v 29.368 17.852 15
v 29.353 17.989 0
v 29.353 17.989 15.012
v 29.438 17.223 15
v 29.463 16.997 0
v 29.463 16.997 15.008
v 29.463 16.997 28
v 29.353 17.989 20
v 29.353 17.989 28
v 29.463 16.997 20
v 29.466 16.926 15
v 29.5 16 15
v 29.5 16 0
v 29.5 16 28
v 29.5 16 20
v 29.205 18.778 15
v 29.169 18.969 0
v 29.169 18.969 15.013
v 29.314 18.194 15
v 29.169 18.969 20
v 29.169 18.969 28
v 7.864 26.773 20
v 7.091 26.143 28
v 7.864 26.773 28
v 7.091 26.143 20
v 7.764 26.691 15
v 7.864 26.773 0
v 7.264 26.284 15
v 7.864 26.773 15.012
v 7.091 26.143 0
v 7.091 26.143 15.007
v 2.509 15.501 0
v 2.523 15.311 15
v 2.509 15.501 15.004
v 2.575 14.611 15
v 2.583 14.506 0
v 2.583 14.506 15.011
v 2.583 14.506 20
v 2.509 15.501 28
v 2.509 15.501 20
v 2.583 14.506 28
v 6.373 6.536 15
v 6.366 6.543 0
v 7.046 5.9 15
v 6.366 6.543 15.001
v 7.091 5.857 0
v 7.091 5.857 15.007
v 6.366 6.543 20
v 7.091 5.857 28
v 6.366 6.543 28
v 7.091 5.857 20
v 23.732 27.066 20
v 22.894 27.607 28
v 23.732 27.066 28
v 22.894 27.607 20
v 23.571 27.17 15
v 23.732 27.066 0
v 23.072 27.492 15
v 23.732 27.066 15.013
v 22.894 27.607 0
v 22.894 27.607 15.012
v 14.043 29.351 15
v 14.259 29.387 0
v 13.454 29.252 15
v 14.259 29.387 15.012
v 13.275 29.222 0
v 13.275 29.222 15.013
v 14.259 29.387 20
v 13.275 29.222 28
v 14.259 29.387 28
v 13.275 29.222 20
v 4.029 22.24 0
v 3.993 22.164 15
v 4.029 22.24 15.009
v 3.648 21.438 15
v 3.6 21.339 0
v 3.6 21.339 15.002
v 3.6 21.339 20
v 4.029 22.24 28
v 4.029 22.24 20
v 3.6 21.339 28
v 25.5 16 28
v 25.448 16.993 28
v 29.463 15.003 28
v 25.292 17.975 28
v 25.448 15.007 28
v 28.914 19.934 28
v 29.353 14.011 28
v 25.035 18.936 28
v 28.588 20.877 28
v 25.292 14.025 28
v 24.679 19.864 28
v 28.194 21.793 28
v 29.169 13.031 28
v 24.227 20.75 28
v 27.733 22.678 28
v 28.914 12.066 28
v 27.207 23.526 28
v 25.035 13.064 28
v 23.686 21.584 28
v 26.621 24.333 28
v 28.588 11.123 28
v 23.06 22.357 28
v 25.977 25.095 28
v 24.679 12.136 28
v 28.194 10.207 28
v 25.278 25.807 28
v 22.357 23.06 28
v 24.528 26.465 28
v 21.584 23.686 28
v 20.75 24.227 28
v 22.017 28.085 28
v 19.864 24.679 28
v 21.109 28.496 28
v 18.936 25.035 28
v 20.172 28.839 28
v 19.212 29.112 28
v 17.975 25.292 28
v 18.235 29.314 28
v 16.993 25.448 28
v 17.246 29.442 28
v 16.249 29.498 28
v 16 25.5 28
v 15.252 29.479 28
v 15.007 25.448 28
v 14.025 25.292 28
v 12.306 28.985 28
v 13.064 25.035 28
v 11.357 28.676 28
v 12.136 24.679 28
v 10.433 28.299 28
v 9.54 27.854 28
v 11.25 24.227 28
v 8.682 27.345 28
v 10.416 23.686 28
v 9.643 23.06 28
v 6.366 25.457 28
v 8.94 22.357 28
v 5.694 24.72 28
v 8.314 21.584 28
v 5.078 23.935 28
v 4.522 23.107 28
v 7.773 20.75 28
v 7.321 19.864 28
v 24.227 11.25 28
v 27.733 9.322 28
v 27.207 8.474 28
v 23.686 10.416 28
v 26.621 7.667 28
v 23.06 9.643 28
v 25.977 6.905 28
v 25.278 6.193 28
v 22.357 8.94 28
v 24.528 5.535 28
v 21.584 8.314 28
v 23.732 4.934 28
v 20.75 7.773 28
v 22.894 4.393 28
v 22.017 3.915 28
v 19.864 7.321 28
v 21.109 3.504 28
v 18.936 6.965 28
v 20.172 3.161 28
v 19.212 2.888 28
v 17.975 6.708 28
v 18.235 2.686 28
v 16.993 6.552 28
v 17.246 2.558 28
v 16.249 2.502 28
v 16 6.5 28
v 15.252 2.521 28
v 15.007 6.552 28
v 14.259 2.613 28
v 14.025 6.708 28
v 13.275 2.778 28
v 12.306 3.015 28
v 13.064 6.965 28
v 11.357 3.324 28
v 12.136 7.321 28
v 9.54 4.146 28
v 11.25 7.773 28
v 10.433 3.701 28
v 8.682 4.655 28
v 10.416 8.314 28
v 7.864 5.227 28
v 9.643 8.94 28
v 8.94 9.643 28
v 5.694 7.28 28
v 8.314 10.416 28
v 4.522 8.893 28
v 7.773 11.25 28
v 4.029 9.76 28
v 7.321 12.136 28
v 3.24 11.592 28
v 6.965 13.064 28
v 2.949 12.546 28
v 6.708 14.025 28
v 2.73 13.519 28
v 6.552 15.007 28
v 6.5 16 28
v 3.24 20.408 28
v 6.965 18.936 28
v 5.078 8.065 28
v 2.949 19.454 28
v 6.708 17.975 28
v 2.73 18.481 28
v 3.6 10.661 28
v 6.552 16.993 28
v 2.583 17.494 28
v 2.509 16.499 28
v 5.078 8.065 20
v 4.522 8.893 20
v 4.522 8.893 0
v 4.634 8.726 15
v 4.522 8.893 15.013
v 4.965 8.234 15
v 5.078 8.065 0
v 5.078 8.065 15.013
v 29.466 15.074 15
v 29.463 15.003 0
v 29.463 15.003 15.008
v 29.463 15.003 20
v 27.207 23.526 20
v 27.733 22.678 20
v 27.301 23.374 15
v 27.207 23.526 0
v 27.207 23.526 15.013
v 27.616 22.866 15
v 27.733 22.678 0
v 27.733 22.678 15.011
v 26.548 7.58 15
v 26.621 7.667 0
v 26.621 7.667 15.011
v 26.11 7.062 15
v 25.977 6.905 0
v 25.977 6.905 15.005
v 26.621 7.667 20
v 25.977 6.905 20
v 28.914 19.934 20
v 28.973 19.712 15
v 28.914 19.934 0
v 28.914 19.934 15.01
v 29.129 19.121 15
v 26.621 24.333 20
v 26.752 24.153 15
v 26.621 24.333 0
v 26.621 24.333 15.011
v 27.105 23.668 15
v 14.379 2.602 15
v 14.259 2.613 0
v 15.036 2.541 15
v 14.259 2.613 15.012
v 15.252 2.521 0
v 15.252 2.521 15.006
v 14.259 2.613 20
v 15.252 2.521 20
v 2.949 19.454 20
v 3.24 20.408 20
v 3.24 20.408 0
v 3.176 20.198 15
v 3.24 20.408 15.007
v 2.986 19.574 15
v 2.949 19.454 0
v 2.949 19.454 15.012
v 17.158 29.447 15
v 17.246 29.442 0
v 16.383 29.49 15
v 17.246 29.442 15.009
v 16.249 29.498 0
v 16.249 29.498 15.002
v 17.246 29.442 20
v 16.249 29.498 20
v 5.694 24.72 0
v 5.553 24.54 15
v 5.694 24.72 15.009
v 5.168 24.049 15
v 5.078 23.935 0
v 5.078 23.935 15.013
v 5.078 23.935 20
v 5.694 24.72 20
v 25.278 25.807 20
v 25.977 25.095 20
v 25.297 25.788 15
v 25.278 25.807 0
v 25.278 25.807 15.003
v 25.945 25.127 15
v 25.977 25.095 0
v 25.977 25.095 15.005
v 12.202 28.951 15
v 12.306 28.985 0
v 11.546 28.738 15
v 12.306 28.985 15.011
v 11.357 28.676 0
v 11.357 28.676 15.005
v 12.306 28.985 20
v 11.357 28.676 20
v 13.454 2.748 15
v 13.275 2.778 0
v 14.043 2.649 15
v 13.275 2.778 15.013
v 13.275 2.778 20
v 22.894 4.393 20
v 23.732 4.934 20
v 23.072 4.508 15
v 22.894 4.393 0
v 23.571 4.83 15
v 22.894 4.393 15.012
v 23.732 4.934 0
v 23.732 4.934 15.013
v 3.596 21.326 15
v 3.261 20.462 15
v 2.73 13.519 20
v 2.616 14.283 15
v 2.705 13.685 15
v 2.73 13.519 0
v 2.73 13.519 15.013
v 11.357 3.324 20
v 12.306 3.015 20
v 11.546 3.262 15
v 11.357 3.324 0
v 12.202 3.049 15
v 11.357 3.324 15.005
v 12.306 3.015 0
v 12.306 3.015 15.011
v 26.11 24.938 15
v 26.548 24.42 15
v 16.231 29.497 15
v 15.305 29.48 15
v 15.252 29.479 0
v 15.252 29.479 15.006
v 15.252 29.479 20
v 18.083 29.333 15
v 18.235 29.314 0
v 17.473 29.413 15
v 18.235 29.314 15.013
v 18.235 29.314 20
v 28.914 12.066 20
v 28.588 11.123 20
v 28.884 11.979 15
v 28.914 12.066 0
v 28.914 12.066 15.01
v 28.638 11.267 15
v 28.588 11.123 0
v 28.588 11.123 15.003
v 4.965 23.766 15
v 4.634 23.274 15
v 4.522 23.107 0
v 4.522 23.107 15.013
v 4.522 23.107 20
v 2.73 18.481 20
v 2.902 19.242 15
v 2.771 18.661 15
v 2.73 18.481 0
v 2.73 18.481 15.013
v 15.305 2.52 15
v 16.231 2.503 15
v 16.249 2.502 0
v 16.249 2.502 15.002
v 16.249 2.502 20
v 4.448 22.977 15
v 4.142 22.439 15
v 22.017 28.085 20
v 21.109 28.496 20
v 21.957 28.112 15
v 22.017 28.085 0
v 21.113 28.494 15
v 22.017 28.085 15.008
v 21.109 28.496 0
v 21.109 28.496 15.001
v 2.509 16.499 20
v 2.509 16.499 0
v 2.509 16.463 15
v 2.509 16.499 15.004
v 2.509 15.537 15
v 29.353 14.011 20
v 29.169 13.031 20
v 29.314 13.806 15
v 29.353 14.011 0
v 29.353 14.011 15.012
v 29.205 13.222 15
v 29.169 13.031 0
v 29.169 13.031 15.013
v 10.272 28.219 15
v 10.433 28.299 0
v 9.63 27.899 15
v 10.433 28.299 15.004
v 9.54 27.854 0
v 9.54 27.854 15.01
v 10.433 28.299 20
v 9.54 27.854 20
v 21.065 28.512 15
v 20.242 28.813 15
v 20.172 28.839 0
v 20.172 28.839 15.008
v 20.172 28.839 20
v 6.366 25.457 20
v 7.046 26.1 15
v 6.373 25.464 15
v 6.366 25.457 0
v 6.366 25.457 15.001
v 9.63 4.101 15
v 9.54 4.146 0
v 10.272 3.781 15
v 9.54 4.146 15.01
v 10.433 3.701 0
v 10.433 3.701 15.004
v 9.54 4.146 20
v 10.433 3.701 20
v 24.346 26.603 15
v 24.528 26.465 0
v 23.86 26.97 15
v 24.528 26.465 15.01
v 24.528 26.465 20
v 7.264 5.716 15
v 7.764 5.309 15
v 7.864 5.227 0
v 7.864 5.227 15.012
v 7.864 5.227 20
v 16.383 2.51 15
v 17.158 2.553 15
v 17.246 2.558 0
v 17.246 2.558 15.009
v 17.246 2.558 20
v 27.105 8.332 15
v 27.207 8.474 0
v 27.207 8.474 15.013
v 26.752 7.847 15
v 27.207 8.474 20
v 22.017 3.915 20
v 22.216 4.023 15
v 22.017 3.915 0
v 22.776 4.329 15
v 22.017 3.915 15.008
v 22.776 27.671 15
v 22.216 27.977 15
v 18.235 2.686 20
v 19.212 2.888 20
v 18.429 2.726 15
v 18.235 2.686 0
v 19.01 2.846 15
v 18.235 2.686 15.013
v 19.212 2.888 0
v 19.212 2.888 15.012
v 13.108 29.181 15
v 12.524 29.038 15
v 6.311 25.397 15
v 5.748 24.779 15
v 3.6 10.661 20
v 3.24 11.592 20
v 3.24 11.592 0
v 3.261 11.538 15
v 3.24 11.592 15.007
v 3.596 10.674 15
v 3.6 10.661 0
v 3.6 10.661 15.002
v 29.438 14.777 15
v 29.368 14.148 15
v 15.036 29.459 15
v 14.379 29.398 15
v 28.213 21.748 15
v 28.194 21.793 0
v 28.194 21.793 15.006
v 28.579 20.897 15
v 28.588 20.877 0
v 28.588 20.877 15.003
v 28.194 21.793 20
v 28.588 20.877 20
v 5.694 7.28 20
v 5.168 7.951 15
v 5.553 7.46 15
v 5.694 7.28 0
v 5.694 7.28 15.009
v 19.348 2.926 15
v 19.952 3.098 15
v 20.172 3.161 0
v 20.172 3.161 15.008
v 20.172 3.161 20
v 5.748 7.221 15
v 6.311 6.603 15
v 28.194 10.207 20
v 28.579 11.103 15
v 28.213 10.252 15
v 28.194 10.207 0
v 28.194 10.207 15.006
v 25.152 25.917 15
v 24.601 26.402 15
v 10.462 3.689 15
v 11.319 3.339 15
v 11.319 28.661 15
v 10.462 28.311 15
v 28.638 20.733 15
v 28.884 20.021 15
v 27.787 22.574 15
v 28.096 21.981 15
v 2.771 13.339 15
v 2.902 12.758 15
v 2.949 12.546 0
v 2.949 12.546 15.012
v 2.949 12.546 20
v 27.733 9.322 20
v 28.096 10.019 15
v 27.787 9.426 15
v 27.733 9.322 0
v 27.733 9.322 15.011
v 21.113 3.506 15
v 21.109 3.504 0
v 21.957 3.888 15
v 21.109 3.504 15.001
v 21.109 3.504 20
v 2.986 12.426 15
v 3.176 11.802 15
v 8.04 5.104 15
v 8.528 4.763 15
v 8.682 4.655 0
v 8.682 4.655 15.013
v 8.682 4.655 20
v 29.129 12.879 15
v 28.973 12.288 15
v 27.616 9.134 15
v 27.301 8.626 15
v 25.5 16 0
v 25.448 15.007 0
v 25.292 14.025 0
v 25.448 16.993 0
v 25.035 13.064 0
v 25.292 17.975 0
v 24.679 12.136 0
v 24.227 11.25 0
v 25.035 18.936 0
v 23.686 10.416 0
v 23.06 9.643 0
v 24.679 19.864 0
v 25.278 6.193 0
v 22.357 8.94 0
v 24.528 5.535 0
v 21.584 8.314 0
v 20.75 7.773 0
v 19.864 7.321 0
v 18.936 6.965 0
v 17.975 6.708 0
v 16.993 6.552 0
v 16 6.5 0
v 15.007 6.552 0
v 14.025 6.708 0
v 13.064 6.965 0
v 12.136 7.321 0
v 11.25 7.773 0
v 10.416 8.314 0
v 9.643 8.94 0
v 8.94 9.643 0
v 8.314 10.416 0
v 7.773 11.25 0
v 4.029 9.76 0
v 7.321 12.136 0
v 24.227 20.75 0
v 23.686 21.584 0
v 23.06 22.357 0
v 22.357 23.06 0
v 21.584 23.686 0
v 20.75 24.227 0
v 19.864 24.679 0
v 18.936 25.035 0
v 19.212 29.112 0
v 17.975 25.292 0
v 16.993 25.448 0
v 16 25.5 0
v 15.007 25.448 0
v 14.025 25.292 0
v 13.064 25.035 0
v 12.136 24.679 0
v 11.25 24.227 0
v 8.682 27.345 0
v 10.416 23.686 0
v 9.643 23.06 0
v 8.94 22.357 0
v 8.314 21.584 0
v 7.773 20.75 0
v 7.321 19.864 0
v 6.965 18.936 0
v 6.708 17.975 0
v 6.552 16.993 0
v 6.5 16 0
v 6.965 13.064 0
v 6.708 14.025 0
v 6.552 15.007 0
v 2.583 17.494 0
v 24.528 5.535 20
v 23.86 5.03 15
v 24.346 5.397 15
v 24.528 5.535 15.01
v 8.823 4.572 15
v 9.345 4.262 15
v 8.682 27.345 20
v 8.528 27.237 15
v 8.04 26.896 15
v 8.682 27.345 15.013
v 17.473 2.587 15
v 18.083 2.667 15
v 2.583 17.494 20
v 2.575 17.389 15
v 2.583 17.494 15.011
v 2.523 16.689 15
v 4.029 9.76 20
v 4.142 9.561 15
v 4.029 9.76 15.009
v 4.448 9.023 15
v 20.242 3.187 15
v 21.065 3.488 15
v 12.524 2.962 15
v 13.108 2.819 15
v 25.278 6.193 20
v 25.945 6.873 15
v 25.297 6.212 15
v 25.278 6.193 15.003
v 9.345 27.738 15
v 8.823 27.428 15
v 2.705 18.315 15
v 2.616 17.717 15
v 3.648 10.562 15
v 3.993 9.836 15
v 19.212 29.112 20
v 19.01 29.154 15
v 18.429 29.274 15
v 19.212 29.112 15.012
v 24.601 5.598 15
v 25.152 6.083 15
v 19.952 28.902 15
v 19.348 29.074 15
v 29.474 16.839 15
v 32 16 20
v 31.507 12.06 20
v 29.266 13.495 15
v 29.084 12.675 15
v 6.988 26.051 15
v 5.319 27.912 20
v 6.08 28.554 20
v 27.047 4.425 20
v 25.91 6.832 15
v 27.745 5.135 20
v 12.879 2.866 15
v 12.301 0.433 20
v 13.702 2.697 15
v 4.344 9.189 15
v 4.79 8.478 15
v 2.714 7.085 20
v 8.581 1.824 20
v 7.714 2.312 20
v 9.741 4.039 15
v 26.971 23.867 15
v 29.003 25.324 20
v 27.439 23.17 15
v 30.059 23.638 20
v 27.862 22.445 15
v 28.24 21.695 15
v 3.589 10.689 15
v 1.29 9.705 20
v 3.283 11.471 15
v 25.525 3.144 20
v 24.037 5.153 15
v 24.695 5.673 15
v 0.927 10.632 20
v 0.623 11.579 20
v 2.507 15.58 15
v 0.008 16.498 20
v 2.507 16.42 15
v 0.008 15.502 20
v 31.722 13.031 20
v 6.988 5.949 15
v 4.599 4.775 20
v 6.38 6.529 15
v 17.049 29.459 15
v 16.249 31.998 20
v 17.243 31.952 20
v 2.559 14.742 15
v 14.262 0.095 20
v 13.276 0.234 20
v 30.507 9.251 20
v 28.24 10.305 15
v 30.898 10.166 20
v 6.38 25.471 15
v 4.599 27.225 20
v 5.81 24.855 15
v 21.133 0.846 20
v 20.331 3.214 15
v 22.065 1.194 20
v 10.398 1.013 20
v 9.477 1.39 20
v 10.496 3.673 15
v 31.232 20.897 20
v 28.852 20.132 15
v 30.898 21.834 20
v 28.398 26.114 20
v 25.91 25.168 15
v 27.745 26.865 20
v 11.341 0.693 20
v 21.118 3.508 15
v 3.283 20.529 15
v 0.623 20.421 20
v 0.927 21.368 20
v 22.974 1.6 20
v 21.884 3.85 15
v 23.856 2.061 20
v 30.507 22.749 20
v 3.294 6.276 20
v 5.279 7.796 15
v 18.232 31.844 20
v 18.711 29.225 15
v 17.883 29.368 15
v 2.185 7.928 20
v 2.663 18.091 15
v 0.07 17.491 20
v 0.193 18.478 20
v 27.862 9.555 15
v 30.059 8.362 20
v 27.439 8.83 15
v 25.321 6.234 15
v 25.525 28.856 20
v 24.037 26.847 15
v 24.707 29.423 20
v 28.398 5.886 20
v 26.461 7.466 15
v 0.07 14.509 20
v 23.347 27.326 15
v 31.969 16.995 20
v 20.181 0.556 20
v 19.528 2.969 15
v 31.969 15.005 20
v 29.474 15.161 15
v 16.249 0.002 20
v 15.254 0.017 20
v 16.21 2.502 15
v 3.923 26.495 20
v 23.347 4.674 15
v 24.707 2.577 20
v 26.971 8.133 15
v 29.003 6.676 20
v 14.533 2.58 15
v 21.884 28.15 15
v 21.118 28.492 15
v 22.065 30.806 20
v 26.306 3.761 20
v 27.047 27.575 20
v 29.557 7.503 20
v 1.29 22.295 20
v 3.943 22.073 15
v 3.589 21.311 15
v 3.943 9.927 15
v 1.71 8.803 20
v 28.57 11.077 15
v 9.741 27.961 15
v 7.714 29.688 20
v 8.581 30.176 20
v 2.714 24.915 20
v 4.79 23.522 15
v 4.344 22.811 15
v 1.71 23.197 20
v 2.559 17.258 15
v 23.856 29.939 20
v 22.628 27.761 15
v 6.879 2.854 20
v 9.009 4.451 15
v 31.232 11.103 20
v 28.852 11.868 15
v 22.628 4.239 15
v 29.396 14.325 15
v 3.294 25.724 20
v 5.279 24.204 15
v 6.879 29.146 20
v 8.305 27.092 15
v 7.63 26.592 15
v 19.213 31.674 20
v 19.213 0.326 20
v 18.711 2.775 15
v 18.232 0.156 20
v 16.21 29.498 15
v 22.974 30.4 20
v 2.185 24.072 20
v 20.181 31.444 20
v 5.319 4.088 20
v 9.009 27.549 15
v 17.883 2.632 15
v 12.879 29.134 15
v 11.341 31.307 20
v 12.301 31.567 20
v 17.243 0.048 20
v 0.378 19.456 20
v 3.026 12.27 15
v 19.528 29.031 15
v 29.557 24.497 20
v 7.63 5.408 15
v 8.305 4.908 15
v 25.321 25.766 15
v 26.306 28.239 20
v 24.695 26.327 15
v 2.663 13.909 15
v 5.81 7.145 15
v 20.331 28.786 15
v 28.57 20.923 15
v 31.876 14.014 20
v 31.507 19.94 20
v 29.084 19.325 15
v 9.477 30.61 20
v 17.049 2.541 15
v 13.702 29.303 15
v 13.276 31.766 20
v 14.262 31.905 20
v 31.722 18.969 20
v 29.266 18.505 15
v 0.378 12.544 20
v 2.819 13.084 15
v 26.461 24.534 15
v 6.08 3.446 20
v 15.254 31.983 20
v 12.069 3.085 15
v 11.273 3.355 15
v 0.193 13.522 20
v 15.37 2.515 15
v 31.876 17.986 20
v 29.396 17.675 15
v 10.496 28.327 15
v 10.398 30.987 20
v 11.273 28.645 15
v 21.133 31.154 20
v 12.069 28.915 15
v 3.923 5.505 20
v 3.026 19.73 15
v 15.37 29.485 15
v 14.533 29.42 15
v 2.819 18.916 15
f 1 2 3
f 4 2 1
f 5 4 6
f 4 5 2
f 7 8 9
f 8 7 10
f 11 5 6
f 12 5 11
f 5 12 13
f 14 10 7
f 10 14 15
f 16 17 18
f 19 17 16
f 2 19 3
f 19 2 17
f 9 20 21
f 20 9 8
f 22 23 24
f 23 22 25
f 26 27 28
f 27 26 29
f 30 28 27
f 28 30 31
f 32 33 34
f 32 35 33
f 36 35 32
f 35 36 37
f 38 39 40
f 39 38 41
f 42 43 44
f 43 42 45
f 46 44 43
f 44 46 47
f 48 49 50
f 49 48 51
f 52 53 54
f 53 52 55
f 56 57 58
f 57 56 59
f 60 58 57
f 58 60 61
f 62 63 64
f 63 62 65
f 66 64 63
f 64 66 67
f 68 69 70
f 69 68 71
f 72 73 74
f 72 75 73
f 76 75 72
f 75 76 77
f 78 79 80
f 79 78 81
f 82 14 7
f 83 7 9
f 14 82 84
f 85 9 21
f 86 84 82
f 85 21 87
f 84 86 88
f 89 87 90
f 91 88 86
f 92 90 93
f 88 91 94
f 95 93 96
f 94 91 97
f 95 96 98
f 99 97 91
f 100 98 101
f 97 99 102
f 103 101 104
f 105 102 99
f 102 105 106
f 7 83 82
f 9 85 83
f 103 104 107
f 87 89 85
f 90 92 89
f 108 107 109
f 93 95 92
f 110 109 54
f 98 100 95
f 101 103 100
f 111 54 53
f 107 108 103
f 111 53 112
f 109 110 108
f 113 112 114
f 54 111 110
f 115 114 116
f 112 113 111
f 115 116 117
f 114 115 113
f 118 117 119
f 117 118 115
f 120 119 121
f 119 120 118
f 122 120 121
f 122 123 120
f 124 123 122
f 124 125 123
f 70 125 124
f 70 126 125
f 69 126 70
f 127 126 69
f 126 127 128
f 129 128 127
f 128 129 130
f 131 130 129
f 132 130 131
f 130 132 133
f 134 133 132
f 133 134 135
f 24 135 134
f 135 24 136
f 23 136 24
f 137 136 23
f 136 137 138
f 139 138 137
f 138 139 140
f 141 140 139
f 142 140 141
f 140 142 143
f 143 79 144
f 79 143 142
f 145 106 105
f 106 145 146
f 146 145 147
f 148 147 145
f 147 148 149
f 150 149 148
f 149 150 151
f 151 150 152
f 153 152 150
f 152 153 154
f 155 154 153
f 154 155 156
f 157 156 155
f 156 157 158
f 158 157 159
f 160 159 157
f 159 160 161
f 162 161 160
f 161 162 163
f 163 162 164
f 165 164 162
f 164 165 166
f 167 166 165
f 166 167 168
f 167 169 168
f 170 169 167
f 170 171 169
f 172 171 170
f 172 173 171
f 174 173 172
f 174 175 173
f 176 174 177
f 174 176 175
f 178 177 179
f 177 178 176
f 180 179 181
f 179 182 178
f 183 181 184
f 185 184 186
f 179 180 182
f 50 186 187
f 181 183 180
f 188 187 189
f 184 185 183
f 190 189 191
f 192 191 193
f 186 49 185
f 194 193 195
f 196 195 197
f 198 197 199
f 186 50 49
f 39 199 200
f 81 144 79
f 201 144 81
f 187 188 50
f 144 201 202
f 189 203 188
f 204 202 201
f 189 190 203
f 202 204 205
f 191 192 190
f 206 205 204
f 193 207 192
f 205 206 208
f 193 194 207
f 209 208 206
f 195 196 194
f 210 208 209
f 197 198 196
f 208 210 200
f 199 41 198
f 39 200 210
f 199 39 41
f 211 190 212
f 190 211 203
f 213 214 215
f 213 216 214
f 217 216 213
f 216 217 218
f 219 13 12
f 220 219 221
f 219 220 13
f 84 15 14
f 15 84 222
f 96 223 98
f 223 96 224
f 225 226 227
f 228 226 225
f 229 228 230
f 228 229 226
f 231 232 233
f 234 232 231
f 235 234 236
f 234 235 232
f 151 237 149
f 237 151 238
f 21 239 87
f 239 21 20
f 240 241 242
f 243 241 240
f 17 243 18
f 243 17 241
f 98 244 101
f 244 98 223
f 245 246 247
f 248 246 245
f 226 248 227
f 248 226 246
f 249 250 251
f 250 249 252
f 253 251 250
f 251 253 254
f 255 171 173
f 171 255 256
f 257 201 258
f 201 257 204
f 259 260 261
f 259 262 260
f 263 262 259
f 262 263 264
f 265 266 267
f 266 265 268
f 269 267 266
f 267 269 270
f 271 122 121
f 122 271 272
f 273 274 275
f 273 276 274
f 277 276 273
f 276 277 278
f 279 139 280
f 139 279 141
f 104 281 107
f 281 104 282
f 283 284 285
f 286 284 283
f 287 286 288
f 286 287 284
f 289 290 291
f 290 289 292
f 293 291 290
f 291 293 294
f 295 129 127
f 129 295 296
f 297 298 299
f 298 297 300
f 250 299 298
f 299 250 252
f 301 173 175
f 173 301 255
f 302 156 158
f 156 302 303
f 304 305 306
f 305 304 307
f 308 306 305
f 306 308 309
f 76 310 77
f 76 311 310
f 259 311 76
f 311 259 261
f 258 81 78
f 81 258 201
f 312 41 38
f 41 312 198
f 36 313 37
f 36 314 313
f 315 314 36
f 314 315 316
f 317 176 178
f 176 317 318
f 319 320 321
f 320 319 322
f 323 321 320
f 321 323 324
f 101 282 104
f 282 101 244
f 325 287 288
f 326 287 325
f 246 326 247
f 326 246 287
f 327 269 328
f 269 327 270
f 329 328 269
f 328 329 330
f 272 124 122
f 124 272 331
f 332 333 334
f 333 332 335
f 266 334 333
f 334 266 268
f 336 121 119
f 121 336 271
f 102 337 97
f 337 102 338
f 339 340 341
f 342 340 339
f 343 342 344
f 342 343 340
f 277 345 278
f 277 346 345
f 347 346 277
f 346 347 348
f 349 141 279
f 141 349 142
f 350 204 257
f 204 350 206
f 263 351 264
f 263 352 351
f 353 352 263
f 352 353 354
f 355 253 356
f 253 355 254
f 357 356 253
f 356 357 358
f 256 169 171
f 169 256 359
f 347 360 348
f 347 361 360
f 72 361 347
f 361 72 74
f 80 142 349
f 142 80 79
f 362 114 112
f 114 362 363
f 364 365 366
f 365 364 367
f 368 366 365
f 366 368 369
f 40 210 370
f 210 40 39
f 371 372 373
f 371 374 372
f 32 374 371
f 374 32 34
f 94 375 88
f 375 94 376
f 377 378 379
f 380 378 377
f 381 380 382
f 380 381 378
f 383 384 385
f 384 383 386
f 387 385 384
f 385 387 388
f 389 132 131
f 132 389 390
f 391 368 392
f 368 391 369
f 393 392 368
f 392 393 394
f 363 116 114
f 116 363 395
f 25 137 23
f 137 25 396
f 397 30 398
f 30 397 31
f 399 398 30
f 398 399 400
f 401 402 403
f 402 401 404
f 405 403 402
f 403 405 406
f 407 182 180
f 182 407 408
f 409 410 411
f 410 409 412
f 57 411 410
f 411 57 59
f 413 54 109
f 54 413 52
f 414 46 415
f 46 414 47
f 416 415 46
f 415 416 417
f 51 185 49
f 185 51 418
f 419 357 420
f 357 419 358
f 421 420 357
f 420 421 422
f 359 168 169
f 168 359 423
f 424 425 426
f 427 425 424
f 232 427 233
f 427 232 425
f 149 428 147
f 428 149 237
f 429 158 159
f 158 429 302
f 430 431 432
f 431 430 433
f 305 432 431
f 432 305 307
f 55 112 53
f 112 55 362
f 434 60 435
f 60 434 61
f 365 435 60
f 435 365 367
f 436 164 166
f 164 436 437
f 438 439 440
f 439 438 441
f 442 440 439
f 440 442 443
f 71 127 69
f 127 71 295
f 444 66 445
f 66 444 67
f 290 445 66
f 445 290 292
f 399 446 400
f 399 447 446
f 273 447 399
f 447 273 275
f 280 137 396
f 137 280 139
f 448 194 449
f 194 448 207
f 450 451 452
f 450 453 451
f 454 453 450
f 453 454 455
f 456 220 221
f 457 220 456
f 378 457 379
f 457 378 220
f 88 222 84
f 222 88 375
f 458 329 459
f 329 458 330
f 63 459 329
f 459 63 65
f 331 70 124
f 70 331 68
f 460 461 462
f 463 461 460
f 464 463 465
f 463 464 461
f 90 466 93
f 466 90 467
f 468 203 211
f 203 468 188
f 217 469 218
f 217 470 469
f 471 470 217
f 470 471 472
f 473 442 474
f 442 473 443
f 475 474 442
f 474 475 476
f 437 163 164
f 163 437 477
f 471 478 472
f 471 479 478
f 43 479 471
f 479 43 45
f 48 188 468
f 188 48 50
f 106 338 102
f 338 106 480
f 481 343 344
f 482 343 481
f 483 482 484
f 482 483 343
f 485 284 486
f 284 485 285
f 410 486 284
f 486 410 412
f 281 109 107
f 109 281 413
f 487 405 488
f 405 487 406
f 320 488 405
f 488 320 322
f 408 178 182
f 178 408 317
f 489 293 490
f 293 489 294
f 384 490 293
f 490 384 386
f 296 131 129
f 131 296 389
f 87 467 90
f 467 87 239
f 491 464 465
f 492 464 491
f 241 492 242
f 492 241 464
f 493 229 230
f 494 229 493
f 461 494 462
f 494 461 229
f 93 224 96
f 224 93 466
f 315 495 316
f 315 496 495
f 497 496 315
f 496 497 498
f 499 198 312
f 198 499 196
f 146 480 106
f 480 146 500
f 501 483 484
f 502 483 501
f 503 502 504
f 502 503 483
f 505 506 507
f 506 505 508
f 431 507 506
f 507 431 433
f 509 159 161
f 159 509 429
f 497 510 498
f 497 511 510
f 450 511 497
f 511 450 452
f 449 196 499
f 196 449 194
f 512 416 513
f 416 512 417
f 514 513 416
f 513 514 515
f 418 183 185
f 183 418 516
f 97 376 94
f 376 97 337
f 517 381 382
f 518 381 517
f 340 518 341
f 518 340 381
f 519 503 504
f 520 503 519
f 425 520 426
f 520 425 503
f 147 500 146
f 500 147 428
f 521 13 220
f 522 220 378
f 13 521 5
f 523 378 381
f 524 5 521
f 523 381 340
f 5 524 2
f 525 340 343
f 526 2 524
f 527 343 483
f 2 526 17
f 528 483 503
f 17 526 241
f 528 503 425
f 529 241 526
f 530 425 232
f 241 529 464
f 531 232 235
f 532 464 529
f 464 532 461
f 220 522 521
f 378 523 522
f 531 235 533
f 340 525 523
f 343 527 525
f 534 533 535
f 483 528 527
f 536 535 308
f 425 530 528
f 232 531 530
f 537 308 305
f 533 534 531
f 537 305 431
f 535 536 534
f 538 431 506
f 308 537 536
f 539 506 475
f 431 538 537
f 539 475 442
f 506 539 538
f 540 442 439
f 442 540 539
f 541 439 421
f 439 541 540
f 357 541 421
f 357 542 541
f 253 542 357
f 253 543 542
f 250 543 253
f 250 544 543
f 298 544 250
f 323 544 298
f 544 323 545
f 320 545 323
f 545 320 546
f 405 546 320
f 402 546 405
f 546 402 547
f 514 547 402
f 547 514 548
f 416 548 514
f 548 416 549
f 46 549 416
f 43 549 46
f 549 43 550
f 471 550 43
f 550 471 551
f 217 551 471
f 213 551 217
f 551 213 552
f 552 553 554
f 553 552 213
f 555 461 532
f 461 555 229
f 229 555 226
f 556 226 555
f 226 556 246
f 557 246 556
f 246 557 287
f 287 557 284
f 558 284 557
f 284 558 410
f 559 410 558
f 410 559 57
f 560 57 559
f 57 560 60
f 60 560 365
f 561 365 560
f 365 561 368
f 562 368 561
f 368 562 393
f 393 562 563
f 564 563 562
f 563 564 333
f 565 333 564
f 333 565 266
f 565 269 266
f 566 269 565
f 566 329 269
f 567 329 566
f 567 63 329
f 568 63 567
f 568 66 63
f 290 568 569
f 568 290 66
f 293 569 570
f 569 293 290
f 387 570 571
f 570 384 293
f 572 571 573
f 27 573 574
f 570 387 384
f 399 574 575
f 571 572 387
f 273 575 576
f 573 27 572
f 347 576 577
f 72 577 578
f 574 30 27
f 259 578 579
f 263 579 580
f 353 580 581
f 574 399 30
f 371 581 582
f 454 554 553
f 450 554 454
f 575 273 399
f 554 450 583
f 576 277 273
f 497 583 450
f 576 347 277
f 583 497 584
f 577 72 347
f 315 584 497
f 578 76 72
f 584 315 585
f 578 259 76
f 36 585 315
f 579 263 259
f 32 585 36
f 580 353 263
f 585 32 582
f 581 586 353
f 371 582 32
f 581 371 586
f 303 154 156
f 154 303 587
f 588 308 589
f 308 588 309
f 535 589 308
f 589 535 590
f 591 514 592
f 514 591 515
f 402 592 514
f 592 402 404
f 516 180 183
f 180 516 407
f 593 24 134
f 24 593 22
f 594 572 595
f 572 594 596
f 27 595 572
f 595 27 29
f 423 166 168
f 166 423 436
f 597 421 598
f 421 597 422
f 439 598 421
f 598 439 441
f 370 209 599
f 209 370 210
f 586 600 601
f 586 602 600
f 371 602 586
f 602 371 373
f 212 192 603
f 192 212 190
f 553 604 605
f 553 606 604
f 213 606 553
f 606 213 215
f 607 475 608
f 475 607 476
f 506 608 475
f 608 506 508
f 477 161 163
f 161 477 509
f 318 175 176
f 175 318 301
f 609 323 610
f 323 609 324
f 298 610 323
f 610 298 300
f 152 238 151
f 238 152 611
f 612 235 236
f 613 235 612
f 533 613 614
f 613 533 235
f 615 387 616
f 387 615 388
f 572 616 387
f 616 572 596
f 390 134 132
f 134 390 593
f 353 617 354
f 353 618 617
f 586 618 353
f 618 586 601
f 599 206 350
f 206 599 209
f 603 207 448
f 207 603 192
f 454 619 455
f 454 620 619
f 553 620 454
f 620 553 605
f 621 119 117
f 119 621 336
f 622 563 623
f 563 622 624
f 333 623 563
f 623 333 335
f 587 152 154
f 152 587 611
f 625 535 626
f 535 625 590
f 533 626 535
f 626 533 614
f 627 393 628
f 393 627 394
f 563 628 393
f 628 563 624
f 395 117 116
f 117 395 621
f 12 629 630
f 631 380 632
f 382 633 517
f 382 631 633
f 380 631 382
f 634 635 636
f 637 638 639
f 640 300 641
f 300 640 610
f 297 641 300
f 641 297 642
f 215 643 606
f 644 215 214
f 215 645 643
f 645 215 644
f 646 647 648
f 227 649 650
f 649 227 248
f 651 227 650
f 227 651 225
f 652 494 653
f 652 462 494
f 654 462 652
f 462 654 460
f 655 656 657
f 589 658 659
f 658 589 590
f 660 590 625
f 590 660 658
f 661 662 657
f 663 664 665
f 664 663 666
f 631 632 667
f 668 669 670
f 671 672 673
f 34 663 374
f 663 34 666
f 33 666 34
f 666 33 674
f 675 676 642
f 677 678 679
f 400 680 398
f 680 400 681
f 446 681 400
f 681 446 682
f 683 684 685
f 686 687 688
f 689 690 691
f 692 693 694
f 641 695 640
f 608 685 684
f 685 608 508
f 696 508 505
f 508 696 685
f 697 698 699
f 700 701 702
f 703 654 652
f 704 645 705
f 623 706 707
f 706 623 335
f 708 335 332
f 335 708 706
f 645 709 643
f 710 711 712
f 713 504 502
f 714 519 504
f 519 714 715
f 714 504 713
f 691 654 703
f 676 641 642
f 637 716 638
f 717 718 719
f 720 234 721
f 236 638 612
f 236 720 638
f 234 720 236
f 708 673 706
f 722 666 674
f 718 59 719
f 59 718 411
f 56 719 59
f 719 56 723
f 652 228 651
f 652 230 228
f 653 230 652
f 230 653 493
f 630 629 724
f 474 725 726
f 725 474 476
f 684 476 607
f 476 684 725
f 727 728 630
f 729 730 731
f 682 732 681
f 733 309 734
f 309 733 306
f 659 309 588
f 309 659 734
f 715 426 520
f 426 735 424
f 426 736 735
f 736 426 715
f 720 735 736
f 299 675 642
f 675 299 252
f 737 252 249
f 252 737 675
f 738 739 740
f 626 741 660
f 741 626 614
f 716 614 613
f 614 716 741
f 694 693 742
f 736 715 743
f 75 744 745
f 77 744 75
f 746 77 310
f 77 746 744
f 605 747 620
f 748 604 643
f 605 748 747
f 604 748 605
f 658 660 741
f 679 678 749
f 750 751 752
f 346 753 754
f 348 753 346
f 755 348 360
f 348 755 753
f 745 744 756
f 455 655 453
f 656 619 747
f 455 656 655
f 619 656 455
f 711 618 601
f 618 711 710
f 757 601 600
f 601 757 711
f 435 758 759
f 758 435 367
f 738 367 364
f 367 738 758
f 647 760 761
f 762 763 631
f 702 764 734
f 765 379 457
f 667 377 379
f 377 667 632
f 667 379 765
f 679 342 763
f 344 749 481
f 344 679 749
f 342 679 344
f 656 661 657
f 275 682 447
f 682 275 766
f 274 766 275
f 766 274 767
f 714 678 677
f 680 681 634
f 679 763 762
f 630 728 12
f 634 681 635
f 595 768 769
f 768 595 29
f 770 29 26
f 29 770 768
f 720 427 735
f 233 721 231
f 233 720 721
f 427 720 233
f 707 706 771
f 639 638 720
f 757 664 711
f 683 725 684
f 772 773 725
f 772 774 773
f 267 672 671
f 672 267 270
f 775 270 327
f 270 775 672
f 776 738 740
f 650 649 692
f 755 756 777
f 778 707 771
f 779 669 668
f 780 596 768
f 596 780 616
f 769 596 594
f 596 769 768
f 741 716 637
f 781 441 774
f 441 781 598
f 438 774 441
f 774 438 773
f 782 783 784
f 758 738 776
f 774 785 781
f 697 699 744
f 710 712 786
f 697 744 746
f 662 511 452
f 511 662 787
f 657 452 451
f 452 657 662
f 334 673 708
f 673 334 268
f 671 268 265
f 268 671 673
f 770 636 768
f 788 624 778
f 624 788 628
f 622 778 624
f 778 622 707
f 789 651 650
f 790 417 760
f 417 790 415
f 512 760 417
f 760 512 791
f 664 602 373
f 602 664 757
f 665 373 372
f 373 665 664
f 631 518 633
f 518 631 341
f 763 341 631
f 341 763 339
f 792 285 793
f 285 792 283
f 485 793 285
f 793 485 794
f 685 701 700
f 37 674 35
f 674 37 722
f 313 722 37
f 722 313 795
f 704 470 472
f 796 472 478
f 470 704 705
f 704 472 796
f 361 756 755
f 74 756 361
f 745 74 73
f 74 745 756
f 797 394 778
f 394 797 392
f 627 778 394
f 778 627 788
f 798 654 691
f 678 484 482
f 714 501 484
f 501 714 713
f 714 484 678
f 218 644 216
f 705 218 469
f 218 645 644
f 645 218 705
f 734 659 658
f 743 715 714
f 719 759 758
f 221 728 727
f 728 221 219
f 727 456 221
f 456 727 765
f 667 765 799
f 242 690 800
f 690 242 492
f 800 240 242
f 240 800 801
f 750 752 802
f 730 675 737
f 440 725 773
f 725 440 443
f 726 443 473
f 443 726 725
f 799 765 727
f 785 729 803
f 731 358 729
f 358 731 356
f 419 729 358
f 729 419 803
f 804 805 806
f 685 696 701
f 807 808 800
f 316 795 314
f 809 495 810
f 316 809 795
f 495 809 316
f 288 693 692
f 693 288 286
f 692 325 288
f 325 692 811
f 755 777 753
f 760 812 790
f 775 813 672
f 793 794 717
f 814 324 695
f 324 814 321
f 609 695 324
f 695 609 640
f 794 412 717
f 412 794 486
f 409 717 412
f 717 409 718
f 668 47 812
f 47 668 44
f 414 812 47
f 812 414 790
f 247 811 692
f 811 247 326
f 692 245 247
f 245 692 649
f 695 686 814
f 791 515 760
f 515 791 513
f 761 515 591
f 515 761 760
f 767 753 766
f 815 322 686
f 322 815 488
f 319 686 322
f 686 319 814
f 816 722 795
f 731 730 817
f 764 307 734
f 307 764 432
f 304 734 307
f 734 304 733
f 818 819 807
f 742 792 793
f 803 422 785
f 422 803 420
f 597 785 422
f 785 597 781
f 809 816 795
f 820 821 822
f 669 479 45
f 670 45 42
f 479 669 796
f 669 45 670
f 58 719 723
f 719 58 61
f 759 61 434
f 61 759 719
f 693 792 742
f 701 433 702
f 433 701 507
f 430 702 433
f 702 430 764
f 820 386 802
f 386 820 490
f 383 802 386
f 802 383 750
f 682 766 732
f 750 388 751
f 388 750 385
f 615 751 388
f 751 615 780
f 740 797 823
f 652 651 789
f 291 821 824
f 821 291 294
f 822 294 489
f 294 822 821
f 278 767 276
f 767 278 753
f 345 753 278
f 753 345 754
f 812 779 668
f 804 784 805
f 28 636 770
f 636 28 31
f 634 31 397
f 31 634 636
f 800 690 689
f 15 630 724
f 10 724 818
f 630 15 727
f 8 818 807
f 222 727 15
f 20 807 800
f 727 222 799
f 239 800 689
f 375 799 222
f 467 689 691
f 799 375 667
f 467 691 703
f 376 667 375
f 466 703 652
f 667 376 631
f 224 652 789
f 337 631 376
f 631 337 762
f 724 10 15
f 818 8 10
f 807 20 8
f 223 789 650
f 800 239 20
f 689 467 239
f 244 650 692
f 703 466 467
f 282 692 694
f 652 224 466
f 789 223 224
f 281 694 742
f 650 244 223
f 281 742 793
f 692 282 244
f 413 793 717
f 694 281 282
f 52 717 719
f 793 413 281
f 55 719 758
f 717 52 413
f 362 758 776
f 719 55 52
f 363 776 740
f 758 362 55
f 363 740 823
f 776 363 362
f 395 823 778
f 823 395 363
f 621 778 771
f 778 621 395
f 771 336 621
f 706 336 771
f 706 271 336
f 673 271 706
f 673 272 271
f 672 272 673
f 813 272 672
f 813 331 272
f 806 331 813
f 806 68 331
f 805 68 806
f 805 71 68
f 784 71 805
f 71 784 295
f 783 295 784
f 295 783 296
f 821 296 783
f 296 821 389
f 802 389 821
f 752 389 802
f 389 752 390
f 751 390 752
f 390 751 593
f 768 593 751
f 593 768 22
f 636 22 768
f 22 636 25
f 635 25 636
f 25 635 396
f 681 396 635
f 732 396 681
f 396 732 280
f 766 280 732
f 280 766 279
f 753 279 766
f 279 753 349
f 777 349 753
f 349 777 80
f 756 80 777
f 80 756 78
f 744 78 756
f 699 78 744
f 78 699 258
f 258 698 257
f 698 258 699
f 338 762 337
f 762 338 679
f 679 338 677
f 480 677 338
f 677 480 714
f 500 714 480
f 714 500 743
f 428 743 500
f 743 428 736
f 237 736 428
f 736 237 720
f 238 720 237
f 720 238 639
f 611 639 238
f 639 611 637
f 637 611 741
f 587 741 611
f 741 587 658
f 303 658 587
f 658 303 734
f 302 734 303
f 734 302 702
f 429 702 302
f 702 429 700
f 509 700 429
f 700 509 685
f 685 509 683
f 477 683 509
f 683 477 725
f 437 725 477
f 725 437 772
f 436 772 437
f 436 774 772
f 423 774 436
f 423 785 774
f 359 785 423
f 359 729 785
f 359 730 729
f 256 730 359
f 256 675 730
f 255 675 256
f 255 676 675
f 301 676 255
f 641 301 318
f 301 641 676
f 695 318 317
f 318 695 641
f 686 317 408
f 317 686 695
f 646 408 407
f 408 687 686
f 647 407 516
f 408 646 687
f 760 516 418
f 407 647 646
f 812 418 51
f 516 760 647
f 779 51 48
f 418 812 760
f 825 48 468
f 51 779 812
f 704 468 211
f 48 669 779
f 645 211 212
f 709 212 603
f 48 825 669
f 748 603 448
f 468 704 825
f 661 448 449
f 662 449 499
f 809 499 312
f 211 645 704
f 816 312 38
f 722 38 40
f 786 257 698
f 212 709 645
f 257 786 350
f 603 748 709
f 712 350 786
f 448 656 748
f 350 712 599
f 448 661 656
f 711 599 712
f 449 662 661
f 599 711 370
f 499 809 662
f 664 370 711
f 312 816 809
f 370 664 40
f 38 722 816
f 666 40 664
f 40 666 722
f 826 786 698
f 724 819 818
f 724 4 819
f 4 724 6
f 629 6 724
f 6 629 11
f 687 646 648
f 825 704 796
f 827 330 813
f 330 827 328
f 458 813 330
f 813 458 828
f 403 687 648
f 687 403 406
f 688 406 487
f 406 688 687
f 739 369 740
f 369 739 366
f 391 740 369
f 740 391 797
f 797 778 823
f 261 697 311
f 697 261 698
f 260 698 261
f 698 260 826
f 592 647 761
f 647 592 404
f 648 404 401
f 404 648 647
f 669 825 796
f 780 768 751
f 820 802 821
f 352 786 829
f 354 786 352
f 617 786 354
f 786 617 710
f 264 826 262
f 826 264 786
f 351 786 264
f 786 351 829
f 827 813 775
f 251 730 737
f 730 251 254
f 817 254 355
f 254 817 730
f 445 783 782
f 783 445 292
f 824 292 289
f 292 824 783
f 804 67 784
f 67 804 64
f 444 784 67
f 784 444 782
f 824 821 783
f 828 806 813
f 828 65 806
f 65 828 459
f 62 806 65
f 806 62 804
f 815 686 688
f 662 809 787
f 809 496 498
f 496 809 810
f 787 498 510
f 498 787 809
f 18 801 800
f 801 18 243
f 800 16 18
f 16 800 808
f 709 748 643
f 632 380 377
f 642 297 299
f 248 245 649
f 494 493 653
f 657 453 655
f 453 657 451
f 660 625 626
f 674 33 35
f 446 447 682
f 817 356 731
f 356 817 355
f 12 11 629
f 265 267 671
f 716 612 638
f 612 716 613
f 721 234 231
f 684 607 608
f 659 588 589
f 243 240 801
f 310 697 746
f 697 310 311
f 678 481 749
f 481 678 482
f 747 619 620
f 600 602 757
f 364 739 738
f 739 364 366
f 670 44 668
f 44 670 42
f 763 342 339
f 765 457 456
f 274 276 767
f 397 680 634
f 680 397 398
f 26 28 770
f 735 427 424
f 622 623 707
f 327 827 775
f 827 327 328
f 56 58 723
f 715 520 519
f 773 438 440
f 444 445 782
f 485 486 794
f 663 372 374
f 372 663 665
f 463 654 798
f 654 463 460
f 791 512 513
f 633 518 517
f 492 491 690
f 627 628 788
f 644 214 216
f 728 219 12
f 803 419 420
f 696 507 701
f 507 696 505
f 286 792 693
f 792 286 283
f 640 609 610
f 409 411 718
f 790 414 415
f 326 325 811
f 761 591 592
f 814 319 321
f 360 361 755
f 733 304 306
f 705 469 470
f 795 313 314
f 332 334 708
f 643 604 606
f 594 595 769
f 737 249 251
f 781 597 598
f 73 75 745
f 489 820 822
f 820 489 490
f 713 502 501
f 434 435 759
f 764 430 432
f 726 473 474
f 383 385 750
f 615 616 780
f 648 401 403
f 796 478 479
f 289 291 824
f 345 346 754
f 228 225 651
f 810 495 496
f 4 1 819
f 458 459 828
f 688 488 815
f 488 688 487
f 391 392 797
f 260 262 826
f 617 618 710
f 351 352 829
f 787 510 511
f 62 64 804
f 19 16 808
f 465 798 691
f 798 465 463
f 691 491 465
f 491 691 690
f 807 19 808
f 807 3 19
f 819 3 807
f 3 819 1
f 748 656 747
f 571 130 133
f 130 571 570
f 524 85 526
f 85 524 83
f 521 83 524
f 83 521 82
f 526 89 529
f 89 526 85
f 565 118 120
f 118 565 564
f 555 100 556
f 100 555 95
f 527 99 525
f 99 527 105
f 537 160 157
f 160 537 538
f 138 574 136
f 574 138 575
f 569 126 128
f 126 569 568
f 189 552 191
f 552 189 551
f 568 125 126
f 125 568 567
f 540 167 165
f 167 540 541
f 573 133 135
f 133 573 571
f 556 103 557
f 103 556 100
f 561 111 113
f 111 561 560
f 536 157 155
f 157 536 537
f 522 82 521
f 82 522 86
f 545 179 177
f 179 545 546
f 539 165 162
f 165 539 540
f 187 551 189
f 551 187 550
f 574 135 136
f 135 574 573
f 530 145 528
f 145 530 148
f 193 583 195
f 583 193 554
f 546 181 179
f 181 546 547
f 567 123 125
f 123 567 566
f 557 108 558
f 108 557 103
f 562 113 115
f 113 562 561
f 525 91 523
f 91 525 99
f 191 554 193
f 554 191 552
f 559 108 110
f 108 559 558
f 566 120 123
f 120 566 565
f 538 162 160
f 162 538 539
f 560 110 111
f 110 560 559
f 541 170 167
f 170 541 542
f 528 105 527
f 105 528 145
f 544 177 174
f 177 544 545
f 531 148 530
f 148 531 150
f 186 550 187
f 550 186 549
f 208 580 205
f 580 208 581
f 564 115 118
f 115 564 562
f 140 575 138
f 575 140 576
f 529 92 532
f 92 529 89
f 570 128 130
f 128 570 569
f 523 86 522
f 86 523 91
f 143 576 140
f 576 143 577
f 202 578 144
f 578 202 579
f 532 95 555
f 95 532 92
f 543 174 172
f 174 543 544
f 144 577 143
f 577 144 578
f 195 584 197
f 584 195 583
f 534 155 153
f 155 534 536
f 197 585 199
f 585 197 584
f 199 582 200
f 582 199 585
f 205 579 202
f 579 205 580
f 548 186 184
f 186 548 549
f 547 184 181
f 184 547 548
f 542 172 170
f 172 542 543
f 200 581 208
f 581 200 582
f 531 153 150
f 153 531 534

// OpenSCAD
//
// Customizable Spool Axle Adapter (by Robert Halter)
// Licensed: Creative Commons - Attribution - Non-Commercial - Share Alike (by-nc-sa)
// see: http://en.wikipedia.org/wiki/Creative_Commons
//
// Generates one adapter - print two of it to be symmetric
// I optimzed/reduced the used Material on the bigger diameter.
//
// Thanks to Emanresu.
// Original design and code by emanresu (http://www.thingiverse.com/Emanresu)
// Customizable Spool Adapter http://www.thingiverse.com/thing:82800
// Origianl Text from him: 
// Generates two symmetric spool bearings/axle adapters/what have you
// spacer can be used to center the spool on a specific axle,
// or to simply keep the bearing/axle adapter from sliding into the spool


// parametrizable user values - change if you want

/* [Diameter] */

// diameter of the axle hole [mm]
axle_hole_diameter = 19;

// diameter of spool hole [mm]
spool_hole_diameter = 27;

// diameter of spool hole [mm]
adapter_diameter = spool_hole_diameter + 5;

/* [Lengts] */

// length of spacer [mm] (useful for centering a spool) 
spacer_length = 20;

// distance bearing sticks into spool hole [mm]
spool_hole_depth = 8;



/* [Hidden] */

// set openSCAD resolution
$fa = 1;
$fs = 1;

// begin of form

// translate to x, y, z = 0
translate([adapter_diameter/2, adapter_diameter/2, 0]) {
	difference() {
		union() {
			// inner adapter
			cylinder(r = spool_hole_diameter/2, h = spacer_length + spool_hole_depth);
			// outer adapter cylinder
			translate([0, 0, spacer_length - (adapter_diameter - spool_hole_diameter)]) {
				cylinder(r2 = adapter_diameter/2, r1 = spool_hole_diameter/2, h = adapter_diameter - spool_hole_diameter);
			}
		}
		// axle hole
      // to be sure make the hole on each end 1 mm longer
		translate([0, 0, -1]) {
      	cylinder(r = axle_hole_diameter/2, h = spacer_length + spool_hole_depth + 2);
		} // translate
	} // difference
} // translate

// end of form
